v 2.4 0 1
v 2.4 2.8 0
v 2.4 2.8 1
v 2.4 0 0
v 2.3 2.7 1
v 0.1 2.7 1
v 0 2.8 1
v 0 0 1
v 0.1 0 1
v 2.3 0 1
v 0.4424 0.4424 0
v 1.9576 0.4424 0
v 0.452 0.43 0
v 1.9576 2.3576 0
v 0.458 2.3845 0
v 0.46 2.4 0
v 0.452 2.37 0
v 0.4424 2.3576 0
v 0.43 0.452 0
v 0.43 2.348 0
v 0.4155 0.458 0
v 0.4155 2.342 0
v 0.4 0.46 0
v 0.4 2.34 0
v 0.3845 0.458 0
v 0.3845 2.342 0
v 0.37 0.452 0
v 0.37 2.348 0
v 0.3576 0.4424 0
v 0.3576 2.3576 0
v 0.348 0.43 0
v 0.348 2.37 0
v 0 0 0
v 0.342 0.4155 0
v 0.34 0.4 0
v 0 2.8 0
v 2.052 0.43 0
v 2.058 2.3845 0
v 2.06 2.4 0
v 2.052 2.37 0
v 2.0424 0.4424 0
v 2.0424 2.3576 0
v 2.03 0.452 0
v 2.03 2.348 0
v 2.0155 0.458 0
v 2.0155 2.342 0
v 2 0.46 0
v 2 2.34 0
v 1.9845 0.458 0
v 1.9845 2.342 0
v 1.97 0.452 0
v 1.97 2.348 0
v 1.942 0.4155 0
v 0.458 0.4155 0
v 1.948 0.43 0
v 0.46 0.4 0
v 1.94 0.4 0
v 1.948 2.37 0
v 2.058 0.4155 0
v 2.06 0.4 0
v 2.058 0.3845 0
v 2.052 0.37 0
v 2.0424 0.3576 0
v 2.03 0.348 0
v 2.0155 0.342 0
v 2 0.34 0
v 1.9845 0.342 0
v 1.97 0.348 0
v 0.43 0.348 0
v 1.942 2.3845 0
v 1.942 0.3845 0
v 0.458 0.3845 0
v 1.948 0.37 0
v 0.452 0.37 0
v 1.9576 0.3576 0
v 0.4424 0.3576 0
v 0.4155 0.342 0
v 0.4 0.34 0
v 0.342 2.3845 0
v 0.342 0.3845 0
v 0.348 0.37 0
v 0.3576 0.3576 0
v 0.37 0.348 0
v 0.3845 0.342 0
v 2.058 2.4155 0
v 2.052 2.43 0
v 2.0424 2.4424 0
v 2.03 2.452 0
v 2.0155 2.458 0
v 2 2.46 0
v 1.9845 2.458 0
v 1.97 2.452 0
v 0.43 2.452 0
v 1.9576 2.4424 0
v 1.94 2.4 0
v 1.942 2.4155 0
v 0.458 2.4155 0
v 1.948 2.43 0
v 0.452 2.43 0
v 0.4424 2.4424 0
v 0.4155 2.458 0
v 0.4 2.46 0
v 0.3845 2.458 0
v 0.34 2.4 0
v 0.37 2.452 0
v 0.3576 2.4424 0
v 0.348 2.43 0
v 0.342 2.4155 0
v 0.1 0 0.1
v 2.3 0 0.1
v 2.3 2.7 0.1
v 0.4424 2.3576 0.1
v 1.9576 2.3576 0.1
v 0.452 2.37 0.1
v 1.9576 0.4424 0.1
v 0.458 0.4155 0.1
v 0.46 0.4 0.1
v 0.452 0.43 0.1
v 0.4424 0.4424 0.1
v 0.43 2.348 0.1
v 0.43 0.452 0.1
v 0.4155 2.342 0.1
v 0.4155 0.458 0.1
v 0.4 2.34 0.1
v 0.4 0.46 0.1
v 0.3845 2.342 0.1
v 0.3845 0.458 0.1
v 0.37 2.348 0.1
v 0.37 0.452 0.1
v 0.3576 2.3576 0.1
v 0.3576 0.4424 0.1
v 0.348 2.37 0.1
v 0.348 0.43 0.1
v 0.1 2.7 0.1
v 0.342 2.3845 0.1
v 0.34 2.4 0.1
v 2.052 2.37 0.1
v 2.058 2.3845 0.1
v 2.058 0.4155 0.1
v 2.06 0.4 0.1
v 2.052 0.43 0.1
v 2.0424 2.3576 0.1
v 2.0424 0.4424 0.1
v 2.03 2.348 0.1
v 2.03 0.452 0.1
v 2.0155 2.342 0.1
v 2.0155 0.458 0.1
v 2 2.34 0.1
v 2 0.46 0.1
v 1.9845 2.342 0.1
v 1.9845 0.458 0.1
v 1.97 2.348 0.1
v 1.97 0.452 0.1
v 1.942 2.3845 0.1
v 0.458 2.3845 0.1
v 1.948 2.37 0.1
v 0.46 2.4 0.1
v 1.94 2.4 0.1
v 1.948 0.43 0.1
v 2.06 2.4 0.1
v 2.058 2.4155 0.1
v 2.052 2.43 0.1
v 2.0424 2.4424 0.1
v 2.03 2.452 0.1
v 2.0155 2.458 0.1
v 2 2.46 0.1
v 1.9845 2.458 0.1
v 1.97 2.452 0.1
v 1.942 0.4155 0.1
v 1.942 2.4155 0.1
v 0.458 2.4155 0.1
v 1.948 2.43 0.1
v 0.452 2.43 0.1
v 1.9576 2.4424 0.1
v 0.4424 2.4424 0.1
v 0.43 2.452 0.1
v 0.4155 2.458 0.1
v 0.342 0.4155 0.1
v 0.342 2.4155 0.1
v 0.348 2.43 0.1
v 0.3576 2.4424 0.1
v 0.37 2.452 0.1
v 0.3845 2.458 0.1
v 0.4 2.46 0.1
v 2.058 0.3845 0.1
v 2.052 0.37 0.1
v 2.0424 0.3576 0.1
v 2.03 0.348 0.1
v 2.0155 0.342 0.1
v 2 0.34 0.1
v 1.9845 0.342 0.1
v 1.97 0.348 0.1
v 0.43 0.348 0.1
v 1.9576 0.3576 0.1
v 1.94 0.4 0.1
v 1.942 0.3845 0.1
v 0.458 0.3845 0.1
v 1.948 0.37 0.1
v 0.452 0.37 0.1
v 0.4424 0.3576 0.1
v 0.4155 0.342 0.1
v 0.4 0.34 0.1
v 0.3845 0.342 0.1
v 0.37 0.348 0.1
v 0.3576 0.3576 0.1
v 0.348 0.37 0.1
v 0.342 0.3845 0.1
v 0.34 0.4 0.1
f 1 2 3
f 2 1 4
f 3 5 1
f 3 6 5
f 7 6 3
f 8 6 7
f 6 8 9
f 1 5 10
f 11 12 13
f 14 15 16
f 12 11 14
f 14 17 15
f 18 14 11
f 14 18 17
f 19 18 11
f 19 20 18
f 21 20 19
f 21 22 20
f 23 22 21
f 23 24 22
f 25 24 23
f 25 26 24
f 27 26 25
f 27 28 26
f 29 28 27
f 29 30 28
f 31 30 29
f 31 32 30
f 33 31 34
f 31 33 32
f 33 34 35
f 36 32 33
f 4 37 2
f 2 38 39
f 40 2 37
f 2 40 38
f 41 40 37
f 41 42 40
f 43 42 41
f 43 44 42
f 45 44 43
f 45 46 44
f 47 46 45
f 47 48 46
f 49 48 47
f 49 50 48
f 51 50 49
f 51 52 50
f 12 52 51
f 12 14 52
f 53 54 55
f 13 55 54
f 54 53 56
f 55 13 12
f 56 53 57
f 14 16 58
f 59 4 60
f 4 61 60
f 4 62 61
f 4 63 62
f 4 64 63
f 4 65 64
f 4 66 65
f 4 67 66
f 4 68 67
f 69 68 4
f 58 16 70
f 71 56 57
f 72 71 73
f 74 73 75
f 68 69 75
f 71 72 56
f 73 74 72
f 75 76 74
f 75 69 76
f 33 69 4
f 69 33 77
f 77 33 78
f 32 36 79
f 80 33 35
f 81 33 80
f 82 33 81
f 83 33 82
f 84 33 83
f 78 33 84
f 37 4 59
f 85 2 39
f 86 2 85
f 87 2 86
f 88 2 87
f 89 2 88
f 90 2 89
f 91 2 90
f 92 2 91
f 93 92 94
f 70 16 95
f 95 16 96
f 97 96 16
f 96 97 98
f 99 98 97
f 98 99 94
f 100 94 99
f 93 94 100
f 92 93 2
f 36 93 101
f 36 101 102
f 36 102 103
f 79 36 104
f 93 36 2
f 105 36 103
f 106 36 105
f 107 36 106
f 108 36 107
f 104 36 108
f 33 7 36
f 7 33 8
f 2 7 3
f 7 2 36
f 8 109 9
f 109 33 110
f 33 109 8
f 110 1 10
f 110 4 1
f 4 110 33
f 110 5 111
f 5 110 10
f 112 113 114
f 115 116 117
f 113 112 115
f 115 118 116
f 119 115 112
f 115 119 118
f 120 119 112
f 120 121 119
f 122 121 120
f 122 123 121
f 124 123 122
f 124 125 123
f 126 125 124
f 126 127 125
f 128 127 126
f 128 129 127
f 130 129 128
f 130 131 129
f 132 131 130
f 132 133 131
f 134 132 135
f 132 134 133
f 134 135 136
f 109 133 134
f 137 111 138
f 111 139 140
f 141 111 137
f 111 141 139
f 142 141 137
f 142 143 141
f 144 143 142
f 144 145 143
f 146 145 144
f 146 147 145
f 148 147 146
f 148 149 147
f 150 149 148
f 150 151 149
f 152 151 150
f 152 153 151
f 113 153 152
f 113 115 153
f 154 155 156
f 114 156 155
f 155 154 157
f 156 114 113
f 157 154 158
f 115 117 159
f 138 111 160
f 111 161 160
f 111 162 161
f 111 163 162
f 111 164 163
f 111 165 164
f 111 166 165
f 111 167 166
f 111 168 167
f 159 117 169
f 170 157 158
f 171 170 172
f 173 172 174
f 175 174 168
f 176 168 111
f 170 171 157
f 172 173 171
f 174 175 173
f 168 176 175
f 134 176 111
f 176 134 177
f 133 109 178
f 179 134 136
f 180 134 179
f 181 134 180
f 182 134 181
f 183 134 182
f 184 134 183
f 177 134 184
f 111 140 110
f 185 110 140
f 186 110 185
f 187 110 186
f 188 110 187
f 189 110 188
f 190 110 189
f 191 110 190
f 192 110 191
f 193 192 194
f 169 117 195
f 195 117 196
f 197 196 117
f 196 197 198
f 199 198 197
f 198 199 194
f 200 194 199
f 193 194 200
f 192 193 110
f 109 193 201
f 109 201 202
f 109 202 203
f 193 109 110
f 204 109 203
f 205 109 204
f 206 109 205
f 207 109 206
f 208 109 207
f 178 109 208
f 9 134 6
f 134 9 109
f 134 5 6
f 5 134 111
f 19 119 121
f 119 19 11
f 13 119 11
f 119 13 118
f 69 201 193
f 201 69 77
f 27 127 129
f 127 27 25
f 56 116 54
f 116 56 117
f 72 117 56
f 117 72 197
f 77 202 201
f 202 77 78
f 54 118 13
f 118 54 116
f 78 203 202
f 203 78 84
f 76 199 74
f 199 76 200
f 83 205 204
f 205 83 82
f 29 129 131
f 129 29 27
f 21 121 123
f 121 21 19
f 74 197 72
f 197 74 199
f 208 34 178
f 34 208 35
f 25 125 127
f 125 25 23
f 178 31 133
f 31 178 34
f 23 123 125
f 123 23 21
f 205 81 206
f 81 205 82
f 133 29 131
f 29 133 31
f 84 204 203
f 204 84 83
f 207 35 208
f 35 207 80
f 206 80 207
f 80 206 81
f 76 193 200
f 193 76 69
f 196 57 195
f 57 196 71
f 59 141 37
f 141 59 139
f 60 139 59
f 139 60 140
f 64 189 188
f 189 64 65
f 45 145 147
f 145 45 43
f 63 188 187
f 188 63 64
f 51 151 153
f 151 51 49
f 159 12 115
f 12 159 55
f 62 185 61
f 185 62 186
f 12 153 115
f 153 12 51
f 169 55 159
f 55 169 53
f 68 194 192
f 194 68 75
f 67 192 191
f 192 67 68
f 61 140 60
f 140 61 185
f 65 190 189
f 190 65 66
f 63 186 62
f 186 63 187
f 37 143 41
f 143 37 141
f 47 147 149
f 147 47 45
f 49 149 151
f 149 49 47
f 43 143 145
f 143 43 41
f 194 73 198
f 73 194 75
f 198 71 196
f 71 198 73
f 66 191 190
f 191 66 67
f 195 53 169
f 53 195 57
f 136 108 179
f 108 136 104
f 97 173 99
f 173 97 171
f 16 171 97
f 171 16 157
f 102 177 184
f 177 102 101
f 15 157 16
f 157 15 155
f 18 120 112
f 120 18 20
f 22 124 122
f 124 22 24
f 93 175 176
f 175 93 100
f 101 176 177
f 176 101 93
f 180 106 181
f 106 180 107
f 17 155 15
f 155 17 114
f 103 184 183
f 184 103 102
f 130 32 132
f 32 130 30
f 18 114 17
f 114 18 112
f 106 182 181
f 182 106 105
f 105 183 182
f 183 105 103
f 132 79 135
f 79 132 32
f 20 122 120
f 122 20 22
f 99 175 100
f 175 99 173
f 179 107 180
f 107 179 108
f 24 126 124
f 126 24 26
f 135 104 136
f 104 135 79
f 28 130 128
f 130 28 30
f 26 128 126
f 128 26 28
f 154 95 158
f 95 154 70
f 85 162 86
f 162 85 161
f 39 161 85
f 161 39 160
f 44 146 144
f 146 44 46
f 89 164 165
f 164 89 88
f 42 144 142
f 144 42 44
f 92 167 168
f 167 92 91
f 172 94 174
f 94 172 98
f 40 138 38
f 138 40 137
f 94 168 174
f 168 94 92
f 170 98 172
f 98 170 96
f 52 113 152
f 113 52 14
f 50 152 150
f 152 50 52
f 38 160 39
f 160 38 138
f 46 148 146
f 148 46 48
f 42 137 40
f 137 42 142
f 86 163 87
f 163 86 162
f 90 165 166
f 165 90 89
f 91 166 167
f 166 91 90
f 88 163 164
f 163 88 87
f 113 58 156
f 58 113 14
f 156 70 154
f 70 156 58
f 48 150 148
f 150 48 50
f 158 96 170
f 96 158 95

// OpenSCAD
difference(){
cube([2.4,2.8,1]);
translate([0.1,-0.1,0.1]){
cube([2.2,2.8,2]);
};

translate([0.4, 0.4, -0.1]){
 cylinder(0.4,0.06,0.06, $fn=24);
};
translate([2, 0.4, -0.1]){
 cylinder(0.4,0.06,0.06, $fn=24);
};

translate([0.4, 2.4, -0.1]){
 cylinder(0.4,0.06,0.06, $fn=24);
};
translate([2, 2.4, -0.1]){
 cylinder(0.4,0.06,0.06, $fn=24);
};

};
